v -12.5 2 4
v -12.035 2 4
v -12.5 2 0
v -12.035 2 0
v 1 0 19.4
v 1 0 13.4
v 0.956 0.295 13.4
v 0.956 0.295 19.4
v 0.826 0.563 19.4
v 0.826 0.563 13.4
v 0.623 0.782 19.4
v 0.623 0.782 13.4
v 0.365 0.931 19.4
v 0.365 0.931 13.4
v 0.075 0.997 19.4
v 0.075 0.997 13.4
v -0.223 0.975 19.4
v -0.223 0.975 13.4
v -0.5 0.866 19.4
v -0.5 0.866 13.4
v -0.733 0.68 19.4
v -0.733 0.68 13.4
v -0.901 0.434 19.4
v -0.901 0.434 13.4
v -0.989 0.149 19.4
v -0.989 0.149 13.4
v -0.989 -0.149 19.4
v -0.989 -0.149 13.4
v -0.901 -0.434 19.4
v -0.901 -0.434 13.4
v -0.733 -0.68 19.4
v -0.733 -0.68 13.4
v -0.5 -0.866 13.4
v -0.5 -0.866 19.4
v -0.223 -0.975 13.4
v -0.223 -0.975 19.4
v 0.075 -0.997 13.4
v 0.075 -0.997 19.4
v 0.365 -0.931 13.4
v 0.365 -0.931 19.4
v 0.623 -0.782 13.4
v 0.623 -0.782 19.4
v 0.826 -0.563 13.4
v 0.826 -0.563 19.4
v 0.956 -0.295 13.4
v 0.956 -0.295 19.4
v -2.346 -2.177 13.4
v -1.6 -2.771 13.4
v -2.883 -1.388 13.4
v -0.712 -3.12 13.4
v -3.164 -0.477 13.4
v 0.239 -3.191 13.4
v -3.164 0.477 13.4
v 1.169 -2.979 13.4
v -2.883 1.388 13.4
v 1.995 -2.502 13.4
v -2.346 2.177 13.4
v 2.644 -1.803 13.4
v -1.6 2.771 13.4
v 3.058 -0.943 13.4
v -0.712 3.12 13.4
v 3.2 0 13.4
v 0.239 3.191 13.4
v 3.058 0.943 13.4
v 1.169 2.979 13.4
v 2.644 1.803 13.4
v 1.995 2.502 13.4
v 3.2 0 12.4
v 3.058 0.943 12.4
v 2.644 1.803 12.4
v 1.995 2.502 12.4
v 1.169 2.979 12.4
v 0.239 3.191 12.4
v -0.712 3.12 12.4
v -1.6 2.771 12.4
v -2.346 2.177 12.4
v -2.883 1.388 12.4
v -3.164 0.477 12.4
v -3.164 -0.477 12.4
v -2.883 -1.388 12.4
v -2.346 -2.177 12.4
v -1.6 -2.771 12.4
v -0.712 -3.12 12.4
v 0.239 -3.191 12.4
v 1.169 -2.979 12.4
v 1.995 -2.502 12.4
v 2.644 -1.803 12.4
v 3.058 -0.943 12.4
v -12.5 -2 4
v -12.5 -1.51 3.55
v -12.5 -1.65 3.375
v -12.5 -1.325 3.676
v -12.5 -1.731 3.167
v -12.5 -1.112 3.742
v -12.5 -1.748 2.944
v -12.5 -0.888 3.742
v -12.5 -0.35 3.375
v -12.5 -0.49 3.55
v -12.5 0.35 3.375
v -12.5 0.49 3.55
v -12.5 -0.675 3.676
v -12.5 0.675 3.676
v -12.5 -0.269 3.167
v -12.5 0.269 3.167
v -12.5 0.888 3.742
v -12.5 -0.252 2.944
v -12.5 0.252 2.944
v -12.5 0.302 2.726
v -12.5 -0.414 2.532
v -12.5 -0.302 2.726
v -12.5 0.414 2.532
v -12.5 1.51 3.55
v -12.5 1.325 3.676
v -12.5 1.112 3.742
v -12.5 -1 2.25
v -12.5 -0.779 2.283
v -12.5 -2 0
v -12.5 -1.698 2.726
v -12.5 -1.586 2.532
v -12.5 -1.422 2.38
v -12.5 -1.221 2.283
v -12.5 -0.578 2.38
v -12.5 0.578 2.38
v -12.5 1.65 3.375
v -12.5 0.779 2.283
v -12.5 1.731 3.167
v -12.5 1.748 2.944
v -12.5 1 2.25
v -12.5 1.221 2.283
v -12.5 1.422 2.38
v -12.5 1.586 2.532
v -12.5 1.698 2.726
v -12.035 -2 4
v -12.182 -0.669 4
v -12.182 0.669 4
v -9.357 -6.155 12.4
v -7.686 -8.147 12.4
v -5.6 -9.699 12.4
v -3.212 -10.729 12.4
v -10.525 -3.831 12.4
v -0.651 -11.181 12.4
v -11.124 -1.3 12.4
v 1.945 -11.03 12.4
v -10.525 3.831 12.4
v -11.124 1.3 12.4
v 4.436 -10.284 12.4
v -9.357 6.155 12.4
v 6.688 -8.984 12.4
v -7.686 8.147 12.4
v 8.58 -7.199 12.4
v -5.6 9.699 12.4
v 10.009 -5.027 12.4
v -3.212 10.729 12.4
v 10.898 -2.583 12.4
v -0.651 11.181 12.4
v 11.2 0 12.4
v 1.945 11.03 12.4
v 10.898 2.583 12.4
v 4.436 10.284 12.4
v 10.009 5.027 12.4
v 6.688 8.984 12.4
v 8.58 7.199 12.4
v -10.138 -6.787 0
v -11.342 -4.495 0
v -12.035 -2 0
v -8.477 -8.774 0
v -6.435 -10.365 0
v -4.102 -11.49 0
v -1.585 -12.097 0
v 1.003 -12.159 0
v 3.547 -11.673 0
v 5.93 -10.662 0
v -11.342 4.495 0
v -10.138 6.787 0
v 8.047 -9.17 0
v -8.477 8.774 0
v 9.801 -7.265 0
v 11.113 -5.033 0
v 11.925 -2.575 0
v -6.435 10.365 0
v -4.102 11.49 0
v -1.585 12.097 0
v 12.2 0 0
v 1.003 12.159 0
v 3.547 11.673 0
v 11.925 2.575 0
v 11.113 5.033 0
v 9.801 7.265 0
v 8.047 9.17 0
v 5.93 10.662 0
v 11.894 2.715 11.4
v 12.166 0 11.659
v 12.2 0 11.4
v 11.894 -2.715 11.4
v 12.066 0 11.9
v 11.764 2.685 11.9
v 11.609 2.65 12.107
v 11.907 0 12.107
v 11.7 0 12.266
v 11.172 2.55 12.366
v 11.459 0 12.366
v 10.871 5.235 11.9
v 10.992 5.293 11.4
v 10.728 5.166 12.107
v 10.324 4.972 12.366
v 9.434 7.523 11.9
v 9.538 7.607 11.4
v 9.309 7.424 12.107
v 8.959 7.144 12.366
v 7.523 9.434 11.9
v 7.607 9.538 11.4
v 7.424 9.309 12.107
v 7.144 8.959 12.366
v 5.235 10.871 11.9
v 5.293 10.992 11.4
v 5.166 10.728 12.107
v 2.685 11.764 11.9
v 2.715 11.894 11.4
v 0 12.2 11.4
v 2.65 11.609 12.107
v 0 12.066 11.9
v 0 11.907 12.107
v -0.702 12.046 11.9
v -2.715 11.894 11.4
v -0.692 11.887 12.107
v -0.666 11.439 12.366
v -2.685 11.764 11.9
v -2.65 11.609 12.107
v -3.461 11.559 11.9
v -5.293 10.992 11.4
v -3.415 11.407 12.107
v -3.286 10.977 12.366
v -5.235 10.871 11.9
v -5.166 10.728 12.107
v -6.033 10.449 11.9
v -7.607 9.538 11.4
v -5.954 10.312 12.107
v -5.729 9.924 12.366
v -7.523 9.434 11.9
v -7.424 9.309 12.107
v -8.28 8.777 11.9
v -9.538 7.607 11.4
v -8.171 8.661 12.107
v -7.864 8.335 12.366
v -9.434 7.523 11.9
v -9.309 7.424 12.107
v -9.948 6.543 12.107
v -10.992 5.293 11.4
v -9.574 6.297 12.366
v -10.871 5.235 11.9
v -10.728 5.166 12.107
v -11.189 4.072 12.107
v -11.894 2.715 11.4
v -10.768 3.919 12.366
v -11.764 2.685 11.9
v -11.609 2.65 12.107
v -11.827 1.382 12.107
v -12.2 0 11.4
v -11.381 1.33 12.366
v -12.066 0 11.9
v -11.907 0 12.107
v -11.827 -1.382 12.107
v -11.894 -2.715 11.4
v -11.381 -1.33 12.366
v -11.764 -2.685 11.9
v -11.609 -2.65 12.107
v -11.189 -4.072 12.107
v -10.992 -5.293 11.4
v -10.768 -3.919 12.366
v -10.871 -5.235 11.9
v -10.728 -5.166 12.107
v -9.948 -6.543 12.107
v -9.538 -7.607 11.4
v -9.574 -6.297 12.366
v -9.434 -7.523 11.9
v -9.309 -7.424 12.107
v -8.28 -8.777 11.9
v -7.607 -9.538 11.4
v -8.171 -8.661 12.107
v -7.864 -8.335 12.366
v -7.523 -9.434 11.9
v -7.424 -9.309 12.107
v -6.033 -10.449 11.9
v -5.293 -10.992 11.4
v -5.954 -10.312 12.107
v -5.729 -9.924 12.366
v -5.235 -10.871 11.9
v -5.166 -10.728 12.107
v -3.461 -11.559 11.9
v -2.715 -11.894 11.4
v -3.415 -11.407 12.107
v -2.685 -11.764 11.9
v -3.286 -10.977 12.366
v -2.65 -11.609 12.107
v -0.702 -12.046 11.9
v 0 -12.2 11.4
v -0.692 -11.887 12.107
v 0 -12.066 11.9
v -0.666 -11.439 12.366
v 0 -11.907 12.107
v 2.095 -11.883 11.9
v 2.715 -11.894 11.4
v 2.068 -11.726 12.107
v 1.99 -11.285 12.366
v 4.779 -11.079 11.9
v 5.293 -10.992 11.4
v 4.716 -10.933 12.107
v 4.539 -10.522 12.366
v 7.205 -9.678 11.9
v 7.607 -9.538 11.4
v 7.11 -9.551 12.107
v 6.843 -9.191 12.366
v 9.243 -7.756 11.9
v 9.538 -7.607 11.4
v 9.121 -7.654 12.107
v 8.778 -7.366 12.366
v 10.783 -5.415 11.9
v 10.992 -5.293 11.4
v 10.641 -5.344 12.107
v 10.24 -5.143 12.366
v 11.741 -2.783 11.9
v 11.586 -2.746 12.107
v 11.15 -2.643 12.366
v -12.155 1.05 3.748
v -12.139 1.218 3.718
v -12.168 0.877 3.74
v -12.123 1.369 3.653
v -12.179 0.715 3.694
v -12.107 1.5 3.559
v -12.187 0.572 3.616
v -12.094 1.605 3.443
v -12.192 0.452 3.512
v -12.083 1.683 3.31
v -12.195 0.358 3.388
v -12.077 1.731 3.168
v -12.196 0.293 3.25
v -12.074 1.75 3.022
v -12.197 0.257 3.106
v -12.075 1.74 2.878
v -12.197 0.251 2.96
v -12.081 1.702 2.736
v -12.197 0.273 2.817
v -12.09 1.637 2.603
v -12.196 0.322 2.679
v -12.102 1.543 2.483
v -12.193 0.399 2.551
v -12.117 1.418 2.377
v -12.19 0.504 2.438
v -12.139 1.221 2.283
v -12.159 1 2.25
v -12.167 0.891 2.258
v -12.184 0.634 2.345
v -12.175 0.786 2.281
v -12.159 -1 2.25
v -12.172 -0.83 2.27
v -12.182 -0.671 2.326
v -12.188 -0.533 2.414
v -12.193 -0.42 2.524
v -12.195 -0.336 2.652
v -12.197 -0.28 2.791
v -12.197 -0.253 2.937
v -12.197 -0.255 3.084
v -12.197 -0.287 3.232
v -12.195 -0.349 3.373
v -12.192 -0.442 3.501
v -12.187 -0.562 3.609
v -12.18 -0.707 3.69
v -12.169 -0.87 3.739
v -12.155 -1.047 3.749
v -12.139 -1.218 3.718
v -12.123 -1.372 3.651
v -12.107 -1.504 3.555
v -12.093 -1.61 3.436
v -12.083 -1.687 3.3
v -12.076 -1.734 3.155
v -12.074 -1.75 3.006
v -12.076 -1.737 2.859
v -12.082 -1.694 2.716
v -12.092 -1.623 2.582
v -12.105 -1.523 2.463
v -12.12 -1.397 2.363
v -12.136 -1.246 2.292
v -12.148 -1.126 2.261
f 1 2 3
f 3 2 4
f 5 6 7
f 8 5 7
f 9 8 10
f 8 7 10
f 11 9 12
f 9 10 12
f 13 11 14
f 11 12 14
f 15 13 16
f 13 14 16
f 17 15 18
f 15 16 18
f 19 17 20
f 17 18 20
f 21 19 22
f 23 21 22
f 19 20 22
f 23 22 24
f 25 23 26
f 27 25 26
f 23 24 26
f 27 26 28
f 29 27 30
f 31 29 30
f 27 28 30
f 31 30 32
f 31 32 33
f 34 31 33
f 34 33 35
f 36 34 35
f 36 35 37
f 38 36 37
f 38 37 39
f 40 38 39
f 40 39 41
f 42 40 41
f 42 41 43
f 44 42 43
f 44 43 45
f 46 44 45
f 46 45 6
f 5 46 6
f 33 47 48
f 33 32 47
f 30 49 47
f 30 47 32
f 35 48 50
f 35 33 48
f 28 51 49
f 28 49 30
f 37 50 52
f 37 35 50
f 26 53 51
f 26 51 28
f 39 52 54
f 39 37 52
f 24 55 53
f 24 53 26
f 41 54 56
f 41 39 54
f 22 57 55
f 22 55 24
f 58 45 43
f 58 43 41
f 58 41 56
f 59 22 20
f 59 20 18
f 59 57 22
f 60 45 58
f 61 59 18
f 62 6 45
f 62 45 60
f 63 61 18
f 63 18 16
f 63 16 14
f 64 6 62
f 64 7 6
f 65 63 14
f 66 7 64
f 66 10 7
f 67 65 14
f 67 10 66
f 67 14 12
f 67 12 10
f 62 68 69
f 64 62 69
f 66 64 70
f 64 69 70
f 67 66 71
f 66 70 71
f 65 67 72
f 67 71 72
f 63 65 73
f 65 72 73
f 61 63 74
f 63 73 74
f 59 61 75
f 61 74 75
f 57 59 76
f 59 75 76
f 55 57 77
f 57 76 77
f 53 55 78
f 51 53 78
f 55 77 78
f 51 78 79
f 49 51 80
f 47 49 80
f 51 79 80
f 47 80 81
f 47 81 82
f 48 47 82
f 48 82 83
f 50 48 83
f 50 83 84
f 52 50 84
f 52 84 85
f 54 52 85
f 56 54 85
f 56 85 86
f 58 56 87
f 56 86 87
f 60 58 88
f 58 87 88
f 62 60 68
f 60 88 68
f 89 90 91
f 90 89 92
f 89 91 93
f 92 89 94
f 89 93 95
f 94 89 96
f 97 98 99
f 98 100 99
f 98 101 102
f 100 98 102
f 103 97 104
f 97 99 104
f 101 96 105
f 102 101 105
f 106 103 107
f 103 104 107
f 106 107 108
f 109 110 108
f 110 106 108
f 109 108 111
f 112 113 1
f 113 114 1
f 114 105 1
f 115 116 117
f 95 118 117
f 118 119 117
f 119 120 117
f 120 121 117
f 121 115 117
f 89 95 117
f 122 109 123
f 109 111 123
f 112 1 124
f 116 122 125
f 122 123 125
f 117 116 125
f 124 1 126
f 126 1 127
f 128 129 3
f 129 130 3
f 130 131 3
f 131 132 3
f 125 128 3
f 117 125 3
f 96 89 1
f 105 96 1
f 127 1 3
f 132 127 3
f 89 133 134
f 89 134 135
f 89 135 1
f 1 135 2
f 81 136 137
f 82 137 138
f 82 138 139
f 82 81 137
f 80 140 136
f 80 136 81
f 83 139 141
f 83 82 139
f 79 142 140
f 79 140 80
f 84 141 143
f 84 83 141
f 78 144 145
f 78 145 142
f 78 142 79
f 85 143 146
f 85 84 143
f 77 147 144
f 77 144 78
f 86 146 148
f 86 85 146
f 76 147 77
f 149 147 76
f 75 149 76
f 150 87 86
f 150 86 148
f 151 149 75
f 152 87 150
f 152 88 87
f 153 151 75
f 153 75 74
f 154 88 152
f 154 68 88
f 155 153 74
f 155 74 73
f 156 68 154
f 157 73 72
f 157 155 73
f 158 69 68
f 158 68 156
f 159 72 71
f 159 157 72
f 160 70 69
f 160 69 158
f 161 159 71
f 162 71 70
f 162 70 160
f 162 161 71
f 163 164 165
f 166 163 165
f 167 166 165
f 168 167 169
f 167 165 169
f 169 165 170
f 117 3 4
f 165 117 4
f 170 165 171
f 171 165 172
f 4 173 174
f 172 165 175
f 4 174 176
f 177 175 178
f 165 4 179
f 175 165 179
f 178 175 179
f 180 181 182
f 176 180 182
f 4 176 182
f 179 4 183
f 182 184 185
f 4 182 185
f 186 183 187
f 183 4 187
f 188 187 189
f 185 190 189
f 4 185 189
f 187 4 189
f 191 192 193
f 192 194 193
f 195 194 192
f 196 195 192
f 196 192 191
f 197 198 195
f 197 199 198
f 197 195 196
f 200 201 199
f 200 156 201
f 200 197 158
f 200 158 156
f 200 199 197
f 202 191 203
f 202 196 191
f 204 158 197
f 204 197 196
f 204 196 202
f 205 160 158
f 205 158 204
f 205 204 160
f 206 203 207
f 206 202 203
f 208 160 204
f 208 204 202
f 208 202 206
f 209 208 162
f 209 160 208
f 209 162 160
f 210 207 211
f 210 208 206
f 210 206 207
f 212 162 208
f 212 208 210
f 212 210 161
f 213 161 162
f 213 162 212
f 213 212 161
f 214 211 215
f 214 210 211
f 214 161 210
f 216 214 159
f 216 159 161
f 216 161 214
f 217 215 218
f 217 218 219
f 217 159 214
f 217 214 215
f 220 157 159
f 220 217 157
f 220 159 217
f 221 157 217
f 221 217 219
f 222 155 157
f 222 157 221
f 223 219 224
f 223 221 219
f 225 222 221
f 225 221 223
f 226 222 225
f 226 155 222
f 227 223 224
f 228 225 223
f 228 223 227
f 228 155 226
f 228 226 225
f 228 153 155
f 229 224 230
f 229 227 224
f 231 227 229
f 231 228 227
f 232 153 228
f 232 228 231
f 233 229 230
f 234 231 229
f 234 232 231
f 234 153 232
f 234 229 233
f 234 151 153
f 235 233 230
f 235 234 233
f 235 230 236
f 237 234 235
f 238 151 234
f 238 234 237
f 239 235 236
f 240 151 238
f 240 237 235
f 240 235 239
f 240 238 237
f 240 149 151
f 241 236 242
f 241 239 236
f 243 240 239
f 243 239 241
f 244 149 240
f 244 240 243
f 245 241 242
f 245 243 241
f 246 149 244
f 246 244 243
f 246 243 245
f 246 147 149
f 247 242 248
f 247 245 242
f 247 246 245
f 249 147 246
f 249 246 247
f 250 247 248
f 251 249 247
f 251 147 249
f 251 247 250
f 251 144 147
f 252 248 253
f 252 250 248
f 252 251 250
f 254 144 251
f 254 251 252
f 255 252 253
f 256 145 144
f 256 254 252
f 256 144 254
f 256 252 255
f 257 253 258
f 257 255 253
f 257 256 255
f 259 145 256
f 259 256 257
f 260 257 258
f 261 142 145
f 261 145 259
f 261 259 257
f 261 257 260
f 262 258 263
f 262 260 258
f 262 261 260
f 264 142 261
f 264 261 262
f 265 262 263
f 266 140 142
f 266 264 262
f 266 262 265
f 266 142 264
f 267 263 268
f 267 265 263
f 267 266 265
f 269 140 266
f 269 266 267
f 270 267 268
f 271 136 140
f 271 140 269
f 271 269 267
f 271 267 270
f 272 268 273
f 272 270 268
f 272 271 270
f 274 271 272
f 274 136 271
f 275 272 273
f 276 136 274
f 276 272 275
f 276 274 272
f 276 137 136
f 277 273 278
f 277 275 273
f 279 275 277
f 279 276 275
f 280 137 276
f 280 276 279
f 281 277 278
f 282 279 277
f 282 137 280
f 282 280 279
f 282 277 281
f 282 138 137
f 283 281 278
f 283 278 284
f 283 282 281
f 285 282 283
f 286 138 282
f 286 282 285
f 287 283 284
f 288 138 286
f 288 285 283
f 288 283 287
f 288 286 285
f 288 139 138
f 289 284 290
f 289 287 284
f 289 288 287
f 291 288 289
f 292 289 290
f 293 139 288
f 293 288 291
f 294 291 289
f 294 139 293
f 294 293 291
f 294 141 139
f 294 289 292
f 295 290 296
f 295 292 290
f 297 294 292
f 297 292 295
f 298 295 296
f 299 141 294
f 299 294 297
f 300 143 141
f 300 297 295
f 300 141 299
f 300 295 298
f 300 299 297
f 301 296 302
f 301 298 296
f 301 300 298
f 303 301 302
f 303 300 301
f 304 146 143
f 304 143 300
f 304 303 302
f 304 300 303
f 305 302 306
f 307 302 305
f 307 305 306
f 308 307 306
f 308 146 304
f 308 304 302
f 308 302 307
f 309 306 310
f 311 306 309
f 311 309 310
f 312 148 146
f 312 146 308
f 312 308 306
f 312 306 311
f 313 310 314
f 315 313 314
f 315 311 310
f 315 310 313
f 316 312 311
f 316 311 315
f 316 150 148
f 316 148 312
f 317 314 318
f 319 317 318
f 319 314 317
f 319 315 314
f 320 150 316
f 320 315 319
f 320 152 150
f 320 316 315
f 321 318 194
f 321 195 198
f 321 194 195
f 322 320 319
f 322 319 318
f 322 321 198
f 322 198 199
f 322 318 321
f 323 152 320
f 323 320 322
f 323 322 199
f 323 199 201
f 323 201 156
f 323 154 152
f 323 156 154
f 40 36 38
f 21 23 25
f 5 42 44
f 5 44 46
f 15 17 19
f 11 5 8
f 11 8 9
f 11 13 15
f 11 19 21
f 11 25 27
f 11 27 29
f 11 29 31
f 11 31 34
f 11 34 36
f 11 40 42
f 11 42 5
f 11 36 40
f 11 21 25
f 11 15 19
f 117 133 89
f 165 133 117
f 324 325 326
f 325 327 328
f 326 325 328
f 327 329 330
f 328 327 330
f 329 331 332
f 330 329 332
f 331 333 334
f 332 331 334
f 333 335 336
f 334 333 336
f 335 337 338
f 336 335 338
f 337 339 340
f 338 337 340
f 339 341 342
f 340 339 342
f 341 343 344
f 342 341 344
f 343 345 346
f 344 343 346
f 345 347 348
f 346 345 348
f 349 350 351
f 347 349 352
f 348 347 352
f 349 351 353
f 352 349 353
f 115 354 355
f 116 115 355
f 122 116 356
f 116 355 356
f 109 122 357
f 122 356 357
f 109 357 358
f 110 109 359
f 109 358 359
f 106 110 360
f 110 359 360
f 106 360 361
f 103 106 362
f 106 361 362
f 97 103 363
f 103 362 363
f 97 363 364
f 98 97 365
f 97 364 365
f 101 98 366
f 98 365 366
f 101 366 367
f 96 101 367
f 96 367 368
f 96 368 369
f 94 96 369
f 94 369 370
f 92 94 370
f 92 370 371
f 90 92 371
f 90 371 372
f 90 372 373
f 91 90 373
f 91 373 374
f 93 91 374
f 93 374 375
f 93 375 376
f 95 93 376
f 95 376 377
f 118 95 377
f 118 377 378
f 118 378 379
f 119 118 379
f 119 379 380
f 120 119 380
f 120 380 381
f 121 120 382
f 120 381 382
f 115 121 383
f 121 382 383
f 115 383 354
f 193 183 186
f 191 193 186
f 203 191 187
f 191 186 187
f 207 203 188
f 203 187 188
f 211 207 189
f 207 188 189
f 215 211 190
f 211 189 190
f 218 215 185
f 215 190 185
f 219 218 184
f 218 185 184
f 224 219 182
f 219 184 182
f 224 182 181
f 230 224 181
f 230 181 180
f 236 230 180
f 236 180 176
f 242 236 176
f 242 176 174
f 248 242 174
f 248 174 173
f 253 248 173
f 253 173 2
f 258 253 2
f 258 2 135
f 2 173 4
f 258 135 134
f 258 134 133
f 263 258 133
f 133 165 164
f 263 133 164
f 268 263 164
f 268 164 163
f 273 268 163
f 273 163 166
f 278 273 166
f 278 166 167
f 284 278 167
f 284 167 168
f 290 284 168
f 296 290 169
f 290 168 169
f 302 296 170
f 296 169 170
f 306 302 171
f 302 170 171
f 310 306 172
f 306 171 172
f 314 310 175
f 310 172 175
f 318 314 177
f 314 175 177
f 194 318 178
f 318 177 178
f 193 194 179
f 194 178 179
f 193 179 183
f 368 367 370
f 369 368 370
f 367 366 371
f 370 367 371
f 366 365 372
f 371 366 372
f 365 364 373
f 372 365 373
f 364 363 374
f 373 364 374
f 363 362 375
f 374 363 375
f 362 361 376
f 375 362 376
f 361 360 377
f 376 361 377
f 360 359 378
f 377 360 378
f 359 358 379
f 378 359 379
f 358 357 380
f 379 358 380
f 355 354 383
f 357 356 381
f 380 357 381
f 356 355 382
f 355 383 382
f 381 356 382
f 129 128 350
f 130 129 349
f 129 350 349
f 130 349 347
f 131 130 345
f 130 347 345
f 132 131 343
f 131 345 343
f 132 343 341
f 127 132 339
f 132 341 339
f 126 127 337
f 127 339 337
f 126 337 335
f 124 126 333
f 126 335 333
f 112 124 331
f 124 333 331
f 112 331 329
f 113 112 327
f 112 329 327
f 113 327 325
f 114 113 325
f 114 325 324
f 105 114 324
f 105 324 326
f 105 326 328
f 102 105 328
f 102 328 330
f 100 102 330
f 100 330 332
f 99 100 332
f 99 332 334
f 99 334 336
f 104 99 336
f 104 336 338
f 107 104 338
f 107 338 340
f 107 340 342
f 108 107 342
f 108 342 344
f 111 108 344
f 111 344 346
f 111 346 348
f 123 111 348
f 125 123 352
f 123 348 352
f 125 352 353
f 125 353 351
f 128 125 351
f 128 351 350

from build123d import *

# Parameters (mm, degrees)
SKETCH1_R           = 12.2
BOSS_EXTRUDE1_DEPTH = 12.4
SKETCH2_R           = 1
BOSS_EXTRUDE2_DEPTH = 7
SKETCH3_R           = 3.2
BOSS_EXTRUDE3_DEPTH = 1
SKETCH4_W           = 4
SKETCH4_H           = 4
SKETCH4_R           = 0.75
BOSS_EXTRUDE4_DEPTH = 12.5
FILLET1_R           = 1


with BuildPart() as part:
    # Sketch1 → Boss-Extrude1 (new body)
    with BuildSketch(Plane.XY):
        Circle(SKETCH1_R)
    extrude(amount=BOSS_EXTRUDE1_DEPTH)

    # Sketch2 → Boss-Extrude2 (add)
    with BuildSketch(Plane.XY.offset(12.4)):
        Circle(SKETCH2_R)
    extrude(amount=BOSS_EXTRUDE2_DEPTH)

    # Sketch3 → Boss-Extrude3 (add)
    with BuildSketch(Plane.XY.offset(12.4)):
        Circle(SKETCH3_R)
    extrude(amount=BOSS_EXTRUDE3_DEPTH)

    # Sketch4 → Boss-Extrude4 (add)
    with BuildSketch(Plane(origin=(0, 0, 0), x_dir=(0, 0, -1), z_dir=(1, 0, 0))):
        with Locations((-2, 0)):
            Rectangle(SKETCH4_W, SKETCH4_H)
        with Locations((-3, 1)):
            Circle(SKETCH4_R, mode=Mode.SUBTRACT)
        with Locations((-3, -1)):
            Circle(SKETCH4_R, mode=Mode.SUBTRACT)
    extrude(amount=-BOSS_EXTRUDE4_DEPTH)

    # Fillet1
    fillet1_edges = [part.edges().sort_by_distance(p)[0] for p in [
        (-12.2, 0, 12.4),
    ]]
    fillet(fillet1_edges, radius=FILLET1_R)


solid = part.part
